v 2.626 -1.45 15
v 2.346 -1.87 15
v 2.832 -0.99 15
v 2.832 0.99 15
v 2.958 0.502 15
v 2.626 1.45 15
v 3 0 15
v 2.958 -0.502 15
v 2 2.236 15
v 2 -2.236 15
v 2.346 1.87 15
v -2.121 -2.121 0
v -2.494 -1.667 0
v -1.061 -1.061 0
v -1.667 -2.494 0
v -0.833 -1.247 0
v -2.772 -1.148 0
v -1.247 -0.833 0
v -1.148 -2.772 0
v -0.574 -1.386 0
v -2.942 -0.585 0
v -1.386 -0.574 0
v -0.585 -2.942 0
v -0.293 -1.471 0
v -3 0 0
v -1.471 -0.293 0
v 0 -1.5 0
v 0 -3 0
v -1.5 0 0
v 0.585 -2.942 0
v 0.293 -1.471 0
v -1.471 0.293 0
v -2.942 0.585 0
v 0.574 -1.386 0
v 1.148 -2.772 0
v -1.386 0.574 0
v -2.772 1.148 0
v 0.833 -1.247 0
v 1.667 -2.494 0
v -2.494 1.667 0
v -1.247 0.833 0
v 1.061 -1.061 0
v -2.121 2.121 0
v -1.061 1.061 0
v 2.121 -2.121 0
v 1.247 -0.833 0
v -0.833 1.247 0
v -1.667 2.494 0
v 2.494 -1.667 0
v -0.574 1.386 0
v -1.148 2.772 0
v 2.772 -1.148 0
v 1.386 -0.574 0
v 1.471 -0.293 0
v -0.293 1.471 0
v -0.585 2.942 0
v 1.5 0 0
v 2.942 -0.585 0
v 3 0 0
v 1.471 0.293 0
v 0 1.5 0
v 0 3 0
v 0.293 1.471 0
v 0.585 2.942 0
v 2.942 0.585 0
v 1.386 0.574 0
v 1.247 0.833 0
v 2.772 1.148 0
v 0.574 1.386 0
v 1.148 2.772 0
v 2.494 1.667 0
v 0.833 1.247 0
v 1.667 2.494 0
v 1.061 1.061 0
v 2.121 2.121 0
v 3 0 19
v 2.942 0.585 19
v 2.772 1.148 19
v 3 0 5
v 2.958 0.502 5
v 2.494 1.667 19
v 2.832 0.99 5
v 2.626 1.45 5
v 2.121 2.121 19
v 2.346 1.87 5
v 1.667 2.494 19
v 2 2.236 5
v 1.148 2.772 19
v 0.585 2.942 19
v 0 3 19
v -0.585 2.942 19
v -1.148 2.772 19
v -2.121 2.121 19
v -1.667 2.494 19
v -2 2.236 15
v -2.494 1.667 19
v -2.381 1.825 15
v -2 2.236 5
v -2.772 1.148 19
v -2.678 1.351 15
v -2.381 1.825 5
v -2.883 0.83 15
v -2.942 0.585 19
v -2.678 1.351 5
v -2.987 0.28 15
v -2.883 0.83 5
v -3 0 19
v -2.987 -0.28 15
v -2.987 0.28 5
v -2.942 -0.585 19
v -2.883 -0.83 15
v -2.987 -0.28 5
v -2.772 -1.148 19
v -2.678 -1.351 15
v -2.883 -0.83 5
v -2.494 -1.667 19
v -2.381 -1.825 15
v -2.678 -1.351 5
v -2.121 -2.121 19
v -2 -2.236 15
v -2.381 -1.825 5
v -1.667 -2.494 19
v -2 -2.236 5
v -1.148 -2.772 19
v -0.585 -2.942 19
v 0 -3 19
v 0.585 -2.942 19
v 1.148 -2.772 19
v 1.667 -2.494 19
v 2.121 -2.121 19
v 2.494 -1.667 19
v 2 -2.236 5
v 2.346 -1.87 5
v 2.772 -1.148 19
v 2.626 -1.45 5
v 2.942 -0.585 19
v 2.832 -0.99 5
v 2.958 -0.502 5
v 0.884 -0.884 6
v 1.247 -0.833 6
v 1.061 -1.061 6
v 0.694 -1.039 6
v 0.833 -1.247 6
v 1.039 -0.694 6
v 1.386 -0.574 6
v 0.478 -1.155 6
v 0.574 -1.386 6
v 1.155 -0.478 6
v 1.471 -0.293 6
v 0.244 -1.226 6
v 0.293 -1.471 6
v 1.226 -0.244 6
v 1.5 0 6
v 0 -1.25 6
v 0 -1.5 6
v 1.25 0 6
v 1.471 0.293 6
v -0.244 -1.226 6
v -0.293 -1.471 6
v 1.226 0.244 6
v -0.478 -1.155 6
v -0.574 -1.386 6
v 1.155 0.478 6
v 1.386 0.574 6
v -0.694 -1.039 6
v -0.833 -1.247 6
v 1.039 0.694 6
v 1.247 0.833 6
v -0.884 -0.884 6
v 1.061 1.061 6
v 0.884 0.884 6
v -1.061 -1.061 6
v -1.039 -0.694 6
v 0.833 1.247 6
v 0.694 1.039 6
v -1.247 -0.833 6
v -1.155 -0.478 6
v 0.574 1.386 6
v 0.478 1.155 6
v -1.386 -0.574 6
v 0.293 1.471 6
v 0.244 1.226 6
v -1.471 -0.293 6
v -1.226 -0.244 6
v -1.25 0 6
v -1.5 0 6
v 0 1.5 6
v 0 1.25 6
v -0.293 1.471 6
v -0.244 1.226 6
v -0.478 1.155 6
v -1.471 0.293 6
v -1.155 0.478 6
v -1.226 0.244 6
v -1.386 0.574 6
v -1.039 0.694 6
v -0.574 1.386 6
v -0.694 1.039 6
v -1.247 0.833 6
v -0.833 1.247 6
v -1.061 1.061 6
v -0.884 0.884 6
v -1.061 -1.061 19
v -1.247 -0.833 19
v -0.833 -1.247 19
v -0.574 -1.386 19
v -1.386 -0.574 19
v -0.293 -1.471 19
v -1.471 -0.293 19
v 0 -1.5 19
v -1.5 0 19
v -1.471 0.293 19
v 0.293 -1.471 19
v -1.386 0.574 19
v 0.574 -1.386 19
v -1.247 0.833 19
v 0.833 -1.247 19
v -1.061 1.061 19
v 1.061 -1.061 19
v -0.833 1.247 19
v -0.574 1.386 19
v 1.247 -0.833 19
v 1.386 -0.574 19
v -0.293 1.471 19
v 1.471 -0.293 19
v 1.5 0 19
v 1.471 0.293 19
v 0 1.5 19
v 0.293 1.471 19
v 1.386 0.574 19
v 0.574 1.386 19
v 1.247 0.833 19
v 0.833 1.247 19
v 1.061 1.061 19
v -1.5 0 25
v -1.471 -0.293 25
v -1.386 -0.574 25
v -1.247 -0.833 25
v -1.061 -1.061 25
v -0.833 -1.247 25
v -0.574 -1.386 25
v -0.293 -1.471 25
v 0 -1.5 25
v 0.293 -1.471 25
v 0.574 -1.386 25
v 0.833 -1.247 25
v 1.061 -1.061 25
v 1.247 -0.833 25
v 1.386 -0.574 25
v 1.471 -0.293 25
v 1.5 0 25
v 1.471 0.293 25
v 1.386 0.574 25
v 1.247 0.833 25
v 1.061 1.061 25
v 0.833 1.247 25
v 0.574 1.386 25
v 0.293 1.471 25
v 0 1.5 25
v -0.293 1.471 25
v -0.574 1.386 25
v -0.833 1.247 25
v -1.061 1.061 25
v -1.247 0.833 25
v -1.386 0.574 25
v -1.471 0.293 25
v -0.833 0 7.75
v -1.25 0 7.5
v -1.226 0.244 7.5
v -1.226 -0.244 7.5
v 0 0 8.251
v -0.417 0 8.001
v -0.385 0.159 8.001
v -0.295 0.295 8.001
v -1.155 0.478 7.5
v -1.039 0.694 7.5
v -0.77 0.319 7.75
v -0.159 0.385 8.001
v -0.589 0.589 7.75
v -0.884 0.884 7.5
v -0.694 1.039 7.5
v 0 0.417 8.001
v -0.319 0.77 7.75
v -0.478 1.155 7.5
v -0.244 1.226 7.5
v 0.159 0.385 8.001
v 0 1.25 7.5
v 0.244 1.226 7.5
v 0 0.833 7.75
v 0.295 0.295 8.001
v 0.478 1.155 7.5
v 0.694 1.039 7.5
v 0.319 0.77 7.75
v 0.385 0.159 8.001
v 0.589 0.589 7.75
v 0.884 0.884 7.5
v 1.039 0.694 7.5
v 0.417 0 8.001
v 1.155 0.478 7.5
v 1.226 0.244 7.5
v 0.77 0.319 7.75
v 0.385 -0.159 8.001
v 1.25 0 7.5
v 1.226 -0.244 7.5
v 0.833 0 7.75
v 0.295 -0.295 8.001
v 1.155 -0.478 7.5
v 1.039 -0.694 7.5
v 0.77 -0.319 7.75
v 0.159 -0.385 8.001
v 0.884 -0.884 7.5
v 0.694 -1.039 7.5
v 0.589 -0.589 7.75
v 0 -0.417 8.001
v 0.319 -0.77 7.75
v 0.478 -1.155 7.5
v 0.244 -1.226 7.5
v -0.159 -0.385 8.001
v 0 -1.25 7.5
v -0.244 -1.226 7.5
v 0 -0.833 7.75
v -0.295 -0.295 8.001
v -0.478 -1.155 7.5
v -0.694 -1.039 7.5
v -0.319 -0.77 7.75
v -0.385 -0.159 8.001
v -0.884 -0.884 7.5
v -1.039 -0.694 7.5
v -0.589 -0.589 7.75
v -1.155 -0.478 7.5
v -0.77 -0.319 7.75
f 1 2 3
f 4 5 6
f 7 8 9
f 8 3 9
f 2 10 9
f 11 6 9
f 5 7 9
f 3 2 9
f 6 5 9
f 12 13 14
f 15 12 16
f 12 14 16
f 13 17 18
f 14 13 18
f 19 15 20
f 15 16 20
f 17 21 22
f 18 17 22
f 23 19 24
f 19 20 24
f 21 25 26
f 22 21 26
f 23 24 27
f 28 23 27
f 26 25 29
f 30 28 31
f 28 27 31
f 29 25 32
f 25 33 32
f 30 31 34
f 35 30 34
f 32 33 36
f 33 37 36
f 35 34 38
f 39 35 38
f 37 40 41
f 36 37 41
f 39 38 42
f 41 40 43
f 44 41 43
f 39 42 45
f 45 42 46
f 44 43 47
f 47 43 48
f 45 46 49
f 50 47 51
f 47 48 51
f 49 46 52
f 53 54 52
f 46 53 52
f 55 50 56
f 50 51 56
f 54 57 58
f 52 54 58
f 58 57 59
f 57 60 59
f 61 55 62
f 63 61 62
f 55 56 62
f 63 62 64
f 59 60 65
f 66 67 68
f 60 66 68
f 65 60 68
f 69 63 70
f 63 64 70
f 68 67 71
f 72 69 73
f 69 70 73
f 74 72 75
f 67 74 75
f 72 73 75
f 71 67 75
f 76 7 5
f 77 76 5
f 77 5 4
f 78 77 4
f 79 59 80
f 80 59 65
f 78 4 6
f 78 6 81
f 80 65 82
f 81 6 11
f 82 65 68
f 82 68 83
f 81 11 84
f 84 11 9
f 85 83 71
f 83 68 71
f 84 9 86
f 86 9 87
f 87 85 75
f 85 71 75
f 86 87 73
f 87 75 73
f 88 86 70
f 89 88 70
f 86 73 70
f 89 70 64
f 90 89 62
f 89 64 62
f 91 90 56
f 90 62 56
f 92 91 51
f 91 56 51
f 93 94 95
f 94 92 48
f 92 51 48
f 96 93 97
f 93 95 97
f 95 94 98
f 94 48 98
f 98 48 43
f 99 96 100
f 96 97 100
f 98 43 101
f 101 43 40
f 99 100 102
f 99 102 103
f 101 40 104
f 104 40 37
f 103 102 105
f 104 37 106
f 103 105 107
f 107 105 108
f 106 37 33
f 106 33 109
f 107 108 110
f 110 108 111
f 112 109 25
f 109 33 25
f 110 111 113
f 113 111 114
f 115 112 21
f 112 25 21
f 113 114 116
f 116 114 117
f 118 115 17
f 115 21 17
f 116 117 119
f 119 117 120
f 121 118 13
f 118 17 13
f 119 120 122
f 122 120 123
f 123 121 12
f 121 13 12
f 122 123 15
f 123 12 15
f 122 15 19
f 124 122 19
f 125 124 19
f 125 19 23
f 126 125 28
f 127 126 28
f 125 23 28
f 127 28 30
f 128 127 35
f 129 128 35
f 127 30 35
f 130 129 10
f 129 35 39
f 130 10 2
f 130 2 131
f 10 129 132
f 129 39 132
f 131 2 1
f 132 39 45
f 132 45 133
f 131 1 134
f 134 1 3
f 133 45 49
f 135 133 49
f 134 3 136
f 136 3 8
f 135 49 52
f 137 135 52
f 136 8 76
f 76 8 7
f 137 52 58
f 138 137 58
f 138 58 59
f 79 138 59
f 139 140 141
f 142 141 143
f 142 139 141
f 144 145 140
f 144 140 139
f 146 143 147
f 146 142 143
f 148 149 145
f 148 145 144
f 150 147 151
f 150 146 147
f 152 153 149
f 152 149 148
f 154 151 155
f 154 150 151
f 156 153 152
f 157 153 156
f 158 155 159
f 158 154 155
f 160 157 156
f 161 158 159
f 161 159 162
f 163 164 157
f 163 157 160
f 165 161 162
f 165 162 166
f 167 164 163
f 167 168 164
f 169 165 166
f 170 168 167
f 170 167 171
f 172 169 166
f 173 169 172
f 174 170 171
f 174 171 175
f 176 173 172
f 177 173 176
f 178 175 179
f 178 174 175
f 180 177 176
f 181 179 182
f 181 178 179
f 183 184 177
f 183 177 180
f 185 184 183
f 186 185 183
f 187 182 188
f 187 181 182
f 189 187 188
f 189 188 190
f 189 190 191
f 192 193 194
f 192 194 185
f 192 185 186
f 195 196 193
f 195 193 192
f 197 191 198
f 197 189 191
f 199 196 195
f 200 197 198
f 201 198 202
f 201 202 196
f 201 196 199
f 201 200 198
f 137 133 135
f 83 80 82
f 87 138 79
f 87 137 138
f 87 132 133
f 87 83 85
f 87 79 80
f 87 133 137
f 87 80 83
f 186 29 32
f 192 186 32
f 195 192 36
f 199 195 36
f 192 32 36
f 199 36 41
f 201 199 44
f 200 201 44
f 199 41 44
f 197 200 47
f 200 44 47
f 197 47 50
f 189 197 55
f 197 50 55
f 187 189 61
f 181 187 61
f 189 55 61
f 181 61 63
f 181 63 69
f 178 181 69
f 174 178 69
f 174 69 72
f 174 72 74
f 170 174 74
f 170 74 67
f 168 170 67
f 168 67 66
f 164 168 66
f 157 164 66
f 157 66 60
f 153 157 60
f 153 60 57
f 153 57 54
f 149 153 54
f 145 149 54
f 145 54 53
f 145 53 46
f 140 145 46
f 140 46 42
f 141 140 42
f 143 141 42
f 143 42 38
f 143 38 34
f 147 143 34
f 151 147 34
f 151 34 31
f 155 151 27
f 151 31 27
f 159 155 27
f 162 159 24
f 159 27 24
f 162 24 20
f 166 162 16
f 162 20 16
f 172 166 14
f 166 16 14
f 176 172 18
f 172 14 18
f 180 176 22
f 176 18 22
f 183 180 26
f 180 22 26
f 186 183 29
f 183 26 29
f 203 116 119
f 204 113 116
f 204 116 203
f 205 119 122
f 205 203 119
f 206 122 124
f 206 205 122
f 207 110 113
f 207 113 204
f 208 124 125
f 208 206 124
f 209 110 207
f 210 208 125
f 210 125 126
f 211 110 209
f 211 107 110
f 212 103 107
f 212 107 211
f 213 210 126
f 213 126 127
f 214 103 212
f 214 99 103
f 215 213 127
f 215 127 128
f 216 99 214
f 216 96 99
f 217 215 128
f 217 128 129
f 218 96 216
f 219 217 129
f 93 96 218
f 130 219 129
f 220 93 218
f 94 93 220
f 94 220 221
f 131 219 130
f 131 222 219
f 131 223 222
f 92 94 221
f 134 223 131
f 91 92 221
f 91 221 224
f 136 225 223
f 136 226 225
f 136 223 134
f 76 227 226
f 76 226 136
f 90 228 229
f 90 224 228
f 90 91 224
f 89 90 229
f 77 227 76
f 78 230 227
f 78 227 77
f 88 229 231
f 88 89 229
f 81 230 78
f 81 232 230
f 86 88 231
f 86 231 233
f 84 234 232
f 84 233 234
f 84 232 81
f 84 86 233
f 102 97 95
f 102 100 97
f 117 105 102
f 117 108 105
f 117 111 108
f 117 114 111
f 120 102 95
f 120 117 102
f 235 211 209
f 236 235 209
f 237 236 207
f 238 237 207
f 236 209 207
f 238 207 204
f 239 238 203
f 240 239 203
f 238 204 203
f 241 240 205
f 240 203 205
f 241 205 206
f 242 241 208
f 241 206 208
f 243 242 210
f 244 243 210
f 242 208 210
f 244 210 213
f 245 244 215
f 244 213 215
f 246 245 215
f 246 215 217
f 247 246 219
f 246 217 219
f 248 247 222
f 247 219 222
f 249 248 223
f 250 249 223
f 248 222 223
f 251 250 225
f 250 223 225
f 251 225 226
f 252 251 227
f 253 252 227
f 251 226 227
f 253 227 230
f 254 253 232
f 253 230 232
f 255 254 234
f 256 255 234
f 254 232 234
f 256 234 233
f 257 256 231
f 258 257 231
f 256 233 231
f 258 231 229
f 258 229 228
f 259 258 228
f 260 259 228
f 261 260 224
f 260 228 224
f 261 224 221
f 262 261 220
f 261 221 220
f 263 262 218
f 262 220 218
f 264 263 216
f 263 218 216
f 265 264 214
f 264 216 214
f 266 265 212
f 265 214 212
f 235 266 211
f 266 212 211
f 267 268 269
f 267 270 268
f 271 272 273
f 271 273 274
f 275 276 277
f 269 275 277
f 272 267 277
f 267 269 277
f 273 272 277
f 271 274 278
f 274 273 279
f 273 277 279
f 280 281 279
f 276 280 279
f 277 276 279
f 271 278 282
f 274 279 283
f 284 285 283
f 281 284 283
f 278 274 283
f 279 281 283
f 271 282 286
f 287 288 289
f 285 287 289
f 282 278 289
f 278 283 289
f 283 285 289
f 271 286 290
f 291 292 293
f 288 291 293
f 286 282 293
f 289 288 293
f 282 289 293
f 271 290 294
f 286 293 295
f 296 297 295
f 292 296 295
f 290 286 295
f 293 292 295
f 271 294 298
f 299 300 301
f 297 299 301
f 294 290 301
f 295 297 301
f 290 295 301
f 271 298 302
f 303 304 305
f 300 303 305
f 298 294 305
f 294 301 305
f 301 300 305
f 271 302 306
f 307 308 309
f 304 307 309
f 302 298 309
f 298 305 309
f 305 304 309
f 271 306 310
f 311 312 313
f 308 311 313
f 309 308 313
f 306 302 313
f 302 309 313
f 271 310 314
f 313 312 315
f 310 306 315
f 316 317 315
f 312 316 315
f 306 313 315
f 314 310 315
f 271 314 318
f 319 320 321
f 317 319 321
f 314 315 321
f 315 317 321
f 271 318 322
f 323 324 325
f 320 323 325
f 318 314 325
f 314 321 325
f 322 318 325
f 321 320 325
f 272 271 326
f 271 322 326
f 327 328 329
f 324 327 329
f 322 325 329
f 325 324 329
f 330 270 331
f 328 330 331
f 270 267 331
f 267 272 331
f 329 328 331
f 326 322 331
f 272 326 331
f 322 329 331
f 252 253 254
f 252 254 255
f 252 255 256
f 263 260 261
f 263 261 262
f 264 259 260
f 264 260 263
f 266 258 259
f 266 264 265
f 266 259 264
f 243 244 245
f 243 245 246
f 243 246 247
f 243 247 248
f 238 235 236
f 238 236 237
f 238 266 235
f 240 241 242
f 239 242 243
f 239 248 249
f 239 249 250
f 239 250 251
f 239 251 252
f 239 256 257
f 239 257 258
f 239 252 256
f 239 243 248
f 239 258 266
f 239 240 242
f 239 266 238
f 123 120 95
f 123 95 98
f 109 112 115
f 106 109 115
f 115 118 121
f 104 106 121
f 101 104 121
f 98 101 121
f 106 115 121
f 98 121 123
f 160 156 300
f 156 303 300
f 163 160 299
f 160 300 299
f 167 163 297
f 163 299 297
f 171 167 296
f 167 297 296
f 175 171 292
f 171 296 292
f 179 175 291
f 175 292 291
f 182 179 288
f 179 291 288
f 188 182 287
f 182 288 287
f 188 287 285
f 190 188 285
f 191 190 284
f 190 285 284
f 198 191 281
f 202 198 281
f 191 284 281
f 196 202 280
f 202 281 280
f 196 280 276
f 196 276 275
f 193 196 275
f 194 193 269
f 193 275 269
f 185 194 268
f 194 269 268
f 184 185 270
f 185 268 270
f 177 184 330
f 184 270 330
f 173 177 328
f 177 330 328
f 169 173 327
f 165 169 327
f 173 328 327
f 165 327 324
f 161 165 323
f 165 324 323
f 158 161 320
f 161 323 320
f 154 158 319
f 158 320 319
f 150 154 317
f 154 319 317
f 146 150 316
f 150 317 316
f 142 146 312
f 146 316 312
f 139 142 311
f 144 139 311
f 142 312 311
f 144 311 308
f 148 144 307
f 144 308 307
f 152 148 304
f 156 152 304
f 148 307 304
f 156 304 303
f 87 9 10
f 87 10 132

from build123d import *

# Parameters (mm, degrees)
SKETCH_1_R                   = 3
EXTRUDE_1_DEPTH              = 19
SKETCH_2_W                   = 1
SKETCH_2_H                   = 10
CUT_EXTRUDE_2_DEPTH          = 9.25
HOLE_WIZARD_M3_1_D           = 2.5
HOLE_WIZARD_M3_1_DEPTH       = 7.5
HOLE_WIZARD_M3_1_CBORE_D     = 3
HOLE_WIZARD_M3_1_CBORE_DEPTH = 6
HOLE_WIZARD_M3_1_TIP         = 0.751075774
SKETCH_4_R                   = 1.5
EXTRUDE_3_DEPTH              = 6


with BuildPart() as part:
    # 草图1 → 拉伸1 (new body)
    with BuildSketch(Plane.XY):
        Circle(SKETCH_1_R)
    extrude(amount=EXTRUDE_1_DEPTH)

    # 草图2 → 拉伸2 (cut, symmetric)
    with BuildSketch(Plane(origin=(0, 0, 0), x_dir=(1, 0, 0), z_dir=(0, 1, 0))):
        with Locations((-2.5, -10)):
            Rectangle(SKETCH_2_W, SKETCH_2_H)
        with Locations((2.5, -10)):
            Rectangle(SKETCH_2_W, SKETCH_2_H)
    extrude(amount=CUT_EXTRUDE_2_DEPTH, both=True, mode=Mode.SUBTRACT)

    # M3 螺纹孔1
    with Locations(Plane(origin=(0, 0, 0), x_dir=(-1, 0, 0), z_dir=(0, 0, -1))):
        with Locations((0, 0)):
            CounterBoreHole(HOLE_WIZARD_M3_1_D / 2, HOLE_WIZARD_M3_1_CBORE_D / 2, HOLE_WIZARD_M3_1_CBORE_DEPTH, depth=HOLE_WIZARD_M3_1_DEPTH)
            with Locations((0, 0, -(HOLE_WIZARD_M3_1_DEPTH + HOLE_WIZARD_M3_1_TIP / 2))):  # 118° drill point
                Cone(0, HOLE_WIZARD_M3_1_D / 2, HOLE_WIZARD_M3_1_TIP, mode=Mode.SUBTRACT)

    # 草图4 → 拉伸3 (add)
    with BuildSketch(Plane.XY.offset(19)):
        with Locations(Location((0, 0, 0), (0, 0, 180))):
            Circle(SKETCH_4_R)
    extrude(amount=EXTRUDE_3_DEPTH)


solid = part.part
